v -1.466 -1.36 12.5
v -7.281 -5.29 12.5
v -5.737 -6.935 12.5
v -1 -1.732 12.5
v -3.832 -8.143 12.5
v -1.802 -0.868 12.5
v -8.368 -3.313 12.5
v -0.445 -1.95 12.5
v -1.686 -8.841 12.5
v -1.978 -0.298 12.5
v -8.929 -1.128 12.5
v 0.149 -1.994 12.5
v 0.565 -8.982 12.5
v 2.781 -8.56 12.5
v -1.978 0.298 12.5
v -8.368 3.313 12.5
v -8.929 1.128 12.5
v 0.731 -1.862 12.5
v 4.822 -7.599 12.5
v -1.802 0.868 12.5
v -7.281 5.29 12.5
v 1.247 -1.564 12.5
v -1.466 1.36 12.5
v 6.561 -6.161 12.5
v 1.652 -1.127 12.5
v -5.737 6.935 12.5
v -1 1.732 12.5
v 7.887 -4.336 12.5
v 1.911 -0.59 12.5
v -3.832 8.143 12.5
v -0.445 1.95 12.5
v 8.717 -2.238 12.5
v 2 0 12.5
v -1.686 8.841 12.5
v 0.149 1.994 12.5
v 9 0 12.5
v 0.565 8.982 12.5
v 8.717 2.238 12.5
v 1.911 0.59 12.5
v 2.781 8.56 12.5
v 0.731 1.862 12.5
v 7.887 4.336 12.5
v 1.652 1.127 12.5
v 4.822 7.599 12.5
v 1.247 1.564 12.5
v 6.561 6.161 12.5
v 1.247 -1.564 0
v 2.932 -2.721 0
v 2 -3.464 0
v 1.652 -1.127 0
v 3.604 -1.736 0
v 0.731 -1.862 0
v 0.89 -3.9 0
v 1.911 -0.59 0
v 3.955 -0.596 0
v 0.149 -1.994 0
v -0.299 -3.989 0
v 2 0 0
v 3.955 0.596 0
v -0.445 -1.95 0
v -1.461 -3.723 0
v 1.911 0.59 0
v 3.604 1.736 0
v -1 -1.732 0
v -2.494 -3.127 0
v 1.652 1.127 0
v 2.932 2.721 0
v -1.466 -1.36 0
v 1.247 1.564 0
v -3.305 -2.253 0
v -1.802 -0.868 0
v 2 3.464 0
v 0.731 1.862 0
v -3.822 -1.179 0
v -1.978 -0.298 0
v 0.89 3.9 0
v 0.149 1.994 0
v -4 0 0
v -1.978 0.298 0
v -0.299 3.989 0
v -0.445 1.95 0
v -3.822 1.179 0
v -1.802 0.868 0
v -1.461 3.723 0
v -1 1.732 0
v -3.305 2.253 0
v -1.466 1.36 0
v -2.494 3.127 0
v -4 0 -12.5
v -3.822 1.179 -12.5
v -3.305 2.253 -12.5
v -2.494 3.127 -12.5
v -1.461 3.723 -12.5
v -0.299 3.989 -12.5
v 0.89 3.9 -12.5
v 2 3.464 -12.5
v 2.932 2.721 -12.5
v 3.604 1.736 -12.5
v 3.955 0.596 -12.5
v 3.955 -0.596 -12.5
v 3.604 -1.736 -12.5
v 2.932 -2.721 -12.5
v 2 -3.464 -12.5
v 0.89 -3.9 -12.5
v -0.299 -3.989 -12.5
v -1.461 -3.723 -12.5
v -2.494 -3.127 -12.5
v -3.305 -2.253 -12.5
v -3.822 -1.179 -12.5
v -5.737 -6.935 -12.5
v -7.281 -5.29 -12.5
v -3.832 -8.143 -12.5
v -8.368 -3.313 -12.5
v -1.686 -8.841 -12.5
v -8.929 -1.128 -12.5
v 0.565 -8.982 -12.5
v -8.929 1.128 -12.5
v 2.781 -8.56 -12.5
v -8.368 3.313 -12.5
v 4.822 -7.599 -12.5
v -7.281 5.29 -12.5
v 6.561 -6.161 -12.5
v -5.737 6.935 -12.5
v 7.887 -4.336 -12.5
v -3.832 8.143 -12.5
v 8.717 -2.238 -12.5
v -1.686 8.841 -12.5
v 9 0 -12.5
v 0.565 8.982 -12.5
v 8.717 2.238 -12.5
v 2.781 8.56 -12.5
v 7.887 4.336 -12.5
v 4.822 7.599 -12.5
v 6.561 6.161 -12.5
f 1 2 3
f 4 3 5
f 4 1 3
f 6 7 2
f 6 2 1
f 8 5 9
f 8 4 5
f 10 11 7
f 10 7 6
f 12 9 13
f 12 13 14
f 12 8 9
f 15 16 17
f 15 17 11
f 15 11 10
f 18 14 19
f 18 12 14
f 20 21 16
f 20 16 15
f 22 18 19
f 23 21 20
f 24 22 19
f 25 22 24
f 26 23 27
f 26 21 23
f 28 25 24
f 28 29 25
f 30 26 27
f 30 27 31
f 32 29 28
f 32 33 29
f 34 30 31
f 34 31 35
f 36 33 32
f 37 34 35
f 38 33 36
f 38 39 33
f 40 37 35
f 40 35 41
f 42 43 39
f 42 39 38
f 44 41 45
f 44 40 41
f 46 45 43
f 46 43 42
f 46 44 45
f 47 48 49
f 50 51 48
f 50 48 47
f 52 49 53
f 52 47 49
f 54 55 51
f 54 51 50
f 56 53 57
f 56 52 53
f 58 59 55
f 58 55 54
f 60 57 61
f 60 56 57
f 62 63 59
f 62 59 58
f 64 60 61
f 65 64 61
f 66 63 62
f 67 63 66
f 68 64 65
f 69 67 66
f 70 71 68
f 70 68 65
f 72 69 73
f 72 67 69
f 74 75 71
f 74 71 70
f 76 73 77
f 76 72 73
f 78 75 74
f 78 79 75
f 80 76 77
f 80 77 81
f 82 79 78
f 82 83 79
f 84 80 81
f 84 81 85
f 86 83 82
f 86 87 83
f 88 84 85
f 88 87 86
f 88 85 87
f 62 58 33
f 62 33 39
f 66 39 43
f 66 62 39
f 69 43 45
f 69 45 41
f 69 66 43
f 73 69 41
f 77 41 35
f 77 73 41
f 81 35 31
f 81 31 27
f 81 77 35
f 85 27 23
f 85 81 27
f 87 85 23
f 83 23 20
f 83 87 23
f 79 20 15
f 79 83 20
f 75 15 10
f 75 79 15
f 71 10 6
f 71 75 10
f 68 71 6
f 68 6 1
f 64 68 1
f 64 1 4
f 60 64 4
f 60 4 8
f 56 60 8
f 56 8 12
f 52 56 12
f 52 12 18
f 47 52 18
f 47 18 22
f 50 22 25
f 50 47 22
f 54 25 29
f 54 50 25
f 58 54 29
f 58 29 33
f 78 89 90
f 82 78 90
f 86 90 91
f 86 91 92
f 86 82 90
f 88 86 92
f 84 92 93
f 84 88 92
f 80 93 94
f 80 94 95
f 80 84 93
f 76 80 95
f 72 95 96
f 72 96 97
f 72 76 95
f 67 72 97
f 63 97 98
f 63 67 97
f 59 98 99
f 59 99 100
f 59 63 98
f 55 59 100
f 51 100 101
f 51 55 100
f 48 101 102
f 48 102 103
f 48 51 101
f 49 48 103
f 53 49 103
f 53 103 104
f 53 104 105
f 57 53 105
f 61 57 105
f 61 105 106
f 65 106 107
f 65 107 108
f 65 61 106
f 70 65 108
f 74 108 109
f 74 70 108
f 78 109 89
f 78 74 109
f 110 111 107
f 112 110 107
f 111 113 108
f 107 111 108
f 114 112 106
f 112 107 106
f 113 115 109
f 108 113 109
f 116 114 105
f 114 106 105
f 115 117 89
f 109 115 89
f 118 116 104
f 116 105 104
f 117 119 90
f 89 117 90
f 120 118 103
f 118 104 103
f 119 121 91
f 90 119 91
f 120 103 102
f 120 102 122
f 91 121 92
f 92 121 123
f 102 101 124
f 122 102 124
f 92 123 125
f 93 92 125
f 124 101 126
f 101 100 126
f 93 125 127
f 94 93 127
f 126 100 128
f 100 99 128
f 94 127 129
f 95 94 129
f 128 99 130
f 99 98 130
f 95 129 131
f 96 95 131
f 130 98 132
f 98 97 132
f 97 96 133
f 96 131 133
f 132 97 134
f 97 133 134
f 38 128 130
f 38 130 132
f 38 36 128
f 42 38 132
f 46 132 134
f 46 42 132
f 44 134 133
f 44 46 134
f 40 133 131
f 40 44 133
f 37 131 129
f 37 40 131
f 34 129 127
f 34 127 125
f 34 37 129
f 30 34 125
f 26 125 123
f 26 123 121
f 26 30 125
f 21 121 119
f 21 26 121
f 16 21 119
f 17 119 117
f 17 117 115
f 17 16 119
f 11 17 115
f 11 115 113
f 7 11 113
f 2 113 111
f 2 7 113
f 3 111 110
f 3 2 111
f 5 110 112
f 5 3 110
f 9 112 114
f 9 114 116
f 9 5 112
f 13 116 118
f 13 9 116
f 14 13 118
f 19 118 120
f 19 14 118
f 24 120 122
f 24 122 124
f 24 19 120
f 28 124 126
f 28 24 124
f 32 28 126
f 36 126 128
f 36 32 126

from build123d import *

# Parameters (mm, degrees)
SKETCH1_R           = 9
BOSS_EXTRUDE1_DEPTH = 12.5
CUT_EXTRUDE1_START  = -12.5
SKETCH2_R           = 2
CUT_EXTRUDE1_DEPTH  = 12.5
CUT_EXTRUDE2_START  = -12.5
SKETCH3_R           = 4
CUT_EXTRUDE2_DEPTH  = 12.5


with BuildPart() as part:
    # Sketch1 → Boss-Extrude1 (new body, symmetric)
    with BuildSketch(Plane.XY):
        Circle(SKETCH1_R)
    extrude(amount=BOSS_EXTRUDE1_DEPTH, both=True)

    # Sketch2 → Cut-Extrude1 (cut)
    with BuildSketch(Plane.XY.offset(12.5).offset(CUT_EXTRUDE1_START)):
        Circle(SKETCH2_R)
    extrude(amount=CUT_EXTRUDE1_DEPTH, mode=Mode.SUBTRACT)

    # Sketch3 → Cut-Extrude2 (cut)
    with BuildSketch(Plane(origin=(0, 0, -12.5), x_dir=(-1, 0, 0), z_dir=(0, 0, -1)).offset(CUT_EXTRUDE2_START)):
        Circle(SKETCH3_R)
    extrude(amount=CUT_EXTRUDE2_DEPTH, mode=Mode.SUBTRACT)


solid = part.part
